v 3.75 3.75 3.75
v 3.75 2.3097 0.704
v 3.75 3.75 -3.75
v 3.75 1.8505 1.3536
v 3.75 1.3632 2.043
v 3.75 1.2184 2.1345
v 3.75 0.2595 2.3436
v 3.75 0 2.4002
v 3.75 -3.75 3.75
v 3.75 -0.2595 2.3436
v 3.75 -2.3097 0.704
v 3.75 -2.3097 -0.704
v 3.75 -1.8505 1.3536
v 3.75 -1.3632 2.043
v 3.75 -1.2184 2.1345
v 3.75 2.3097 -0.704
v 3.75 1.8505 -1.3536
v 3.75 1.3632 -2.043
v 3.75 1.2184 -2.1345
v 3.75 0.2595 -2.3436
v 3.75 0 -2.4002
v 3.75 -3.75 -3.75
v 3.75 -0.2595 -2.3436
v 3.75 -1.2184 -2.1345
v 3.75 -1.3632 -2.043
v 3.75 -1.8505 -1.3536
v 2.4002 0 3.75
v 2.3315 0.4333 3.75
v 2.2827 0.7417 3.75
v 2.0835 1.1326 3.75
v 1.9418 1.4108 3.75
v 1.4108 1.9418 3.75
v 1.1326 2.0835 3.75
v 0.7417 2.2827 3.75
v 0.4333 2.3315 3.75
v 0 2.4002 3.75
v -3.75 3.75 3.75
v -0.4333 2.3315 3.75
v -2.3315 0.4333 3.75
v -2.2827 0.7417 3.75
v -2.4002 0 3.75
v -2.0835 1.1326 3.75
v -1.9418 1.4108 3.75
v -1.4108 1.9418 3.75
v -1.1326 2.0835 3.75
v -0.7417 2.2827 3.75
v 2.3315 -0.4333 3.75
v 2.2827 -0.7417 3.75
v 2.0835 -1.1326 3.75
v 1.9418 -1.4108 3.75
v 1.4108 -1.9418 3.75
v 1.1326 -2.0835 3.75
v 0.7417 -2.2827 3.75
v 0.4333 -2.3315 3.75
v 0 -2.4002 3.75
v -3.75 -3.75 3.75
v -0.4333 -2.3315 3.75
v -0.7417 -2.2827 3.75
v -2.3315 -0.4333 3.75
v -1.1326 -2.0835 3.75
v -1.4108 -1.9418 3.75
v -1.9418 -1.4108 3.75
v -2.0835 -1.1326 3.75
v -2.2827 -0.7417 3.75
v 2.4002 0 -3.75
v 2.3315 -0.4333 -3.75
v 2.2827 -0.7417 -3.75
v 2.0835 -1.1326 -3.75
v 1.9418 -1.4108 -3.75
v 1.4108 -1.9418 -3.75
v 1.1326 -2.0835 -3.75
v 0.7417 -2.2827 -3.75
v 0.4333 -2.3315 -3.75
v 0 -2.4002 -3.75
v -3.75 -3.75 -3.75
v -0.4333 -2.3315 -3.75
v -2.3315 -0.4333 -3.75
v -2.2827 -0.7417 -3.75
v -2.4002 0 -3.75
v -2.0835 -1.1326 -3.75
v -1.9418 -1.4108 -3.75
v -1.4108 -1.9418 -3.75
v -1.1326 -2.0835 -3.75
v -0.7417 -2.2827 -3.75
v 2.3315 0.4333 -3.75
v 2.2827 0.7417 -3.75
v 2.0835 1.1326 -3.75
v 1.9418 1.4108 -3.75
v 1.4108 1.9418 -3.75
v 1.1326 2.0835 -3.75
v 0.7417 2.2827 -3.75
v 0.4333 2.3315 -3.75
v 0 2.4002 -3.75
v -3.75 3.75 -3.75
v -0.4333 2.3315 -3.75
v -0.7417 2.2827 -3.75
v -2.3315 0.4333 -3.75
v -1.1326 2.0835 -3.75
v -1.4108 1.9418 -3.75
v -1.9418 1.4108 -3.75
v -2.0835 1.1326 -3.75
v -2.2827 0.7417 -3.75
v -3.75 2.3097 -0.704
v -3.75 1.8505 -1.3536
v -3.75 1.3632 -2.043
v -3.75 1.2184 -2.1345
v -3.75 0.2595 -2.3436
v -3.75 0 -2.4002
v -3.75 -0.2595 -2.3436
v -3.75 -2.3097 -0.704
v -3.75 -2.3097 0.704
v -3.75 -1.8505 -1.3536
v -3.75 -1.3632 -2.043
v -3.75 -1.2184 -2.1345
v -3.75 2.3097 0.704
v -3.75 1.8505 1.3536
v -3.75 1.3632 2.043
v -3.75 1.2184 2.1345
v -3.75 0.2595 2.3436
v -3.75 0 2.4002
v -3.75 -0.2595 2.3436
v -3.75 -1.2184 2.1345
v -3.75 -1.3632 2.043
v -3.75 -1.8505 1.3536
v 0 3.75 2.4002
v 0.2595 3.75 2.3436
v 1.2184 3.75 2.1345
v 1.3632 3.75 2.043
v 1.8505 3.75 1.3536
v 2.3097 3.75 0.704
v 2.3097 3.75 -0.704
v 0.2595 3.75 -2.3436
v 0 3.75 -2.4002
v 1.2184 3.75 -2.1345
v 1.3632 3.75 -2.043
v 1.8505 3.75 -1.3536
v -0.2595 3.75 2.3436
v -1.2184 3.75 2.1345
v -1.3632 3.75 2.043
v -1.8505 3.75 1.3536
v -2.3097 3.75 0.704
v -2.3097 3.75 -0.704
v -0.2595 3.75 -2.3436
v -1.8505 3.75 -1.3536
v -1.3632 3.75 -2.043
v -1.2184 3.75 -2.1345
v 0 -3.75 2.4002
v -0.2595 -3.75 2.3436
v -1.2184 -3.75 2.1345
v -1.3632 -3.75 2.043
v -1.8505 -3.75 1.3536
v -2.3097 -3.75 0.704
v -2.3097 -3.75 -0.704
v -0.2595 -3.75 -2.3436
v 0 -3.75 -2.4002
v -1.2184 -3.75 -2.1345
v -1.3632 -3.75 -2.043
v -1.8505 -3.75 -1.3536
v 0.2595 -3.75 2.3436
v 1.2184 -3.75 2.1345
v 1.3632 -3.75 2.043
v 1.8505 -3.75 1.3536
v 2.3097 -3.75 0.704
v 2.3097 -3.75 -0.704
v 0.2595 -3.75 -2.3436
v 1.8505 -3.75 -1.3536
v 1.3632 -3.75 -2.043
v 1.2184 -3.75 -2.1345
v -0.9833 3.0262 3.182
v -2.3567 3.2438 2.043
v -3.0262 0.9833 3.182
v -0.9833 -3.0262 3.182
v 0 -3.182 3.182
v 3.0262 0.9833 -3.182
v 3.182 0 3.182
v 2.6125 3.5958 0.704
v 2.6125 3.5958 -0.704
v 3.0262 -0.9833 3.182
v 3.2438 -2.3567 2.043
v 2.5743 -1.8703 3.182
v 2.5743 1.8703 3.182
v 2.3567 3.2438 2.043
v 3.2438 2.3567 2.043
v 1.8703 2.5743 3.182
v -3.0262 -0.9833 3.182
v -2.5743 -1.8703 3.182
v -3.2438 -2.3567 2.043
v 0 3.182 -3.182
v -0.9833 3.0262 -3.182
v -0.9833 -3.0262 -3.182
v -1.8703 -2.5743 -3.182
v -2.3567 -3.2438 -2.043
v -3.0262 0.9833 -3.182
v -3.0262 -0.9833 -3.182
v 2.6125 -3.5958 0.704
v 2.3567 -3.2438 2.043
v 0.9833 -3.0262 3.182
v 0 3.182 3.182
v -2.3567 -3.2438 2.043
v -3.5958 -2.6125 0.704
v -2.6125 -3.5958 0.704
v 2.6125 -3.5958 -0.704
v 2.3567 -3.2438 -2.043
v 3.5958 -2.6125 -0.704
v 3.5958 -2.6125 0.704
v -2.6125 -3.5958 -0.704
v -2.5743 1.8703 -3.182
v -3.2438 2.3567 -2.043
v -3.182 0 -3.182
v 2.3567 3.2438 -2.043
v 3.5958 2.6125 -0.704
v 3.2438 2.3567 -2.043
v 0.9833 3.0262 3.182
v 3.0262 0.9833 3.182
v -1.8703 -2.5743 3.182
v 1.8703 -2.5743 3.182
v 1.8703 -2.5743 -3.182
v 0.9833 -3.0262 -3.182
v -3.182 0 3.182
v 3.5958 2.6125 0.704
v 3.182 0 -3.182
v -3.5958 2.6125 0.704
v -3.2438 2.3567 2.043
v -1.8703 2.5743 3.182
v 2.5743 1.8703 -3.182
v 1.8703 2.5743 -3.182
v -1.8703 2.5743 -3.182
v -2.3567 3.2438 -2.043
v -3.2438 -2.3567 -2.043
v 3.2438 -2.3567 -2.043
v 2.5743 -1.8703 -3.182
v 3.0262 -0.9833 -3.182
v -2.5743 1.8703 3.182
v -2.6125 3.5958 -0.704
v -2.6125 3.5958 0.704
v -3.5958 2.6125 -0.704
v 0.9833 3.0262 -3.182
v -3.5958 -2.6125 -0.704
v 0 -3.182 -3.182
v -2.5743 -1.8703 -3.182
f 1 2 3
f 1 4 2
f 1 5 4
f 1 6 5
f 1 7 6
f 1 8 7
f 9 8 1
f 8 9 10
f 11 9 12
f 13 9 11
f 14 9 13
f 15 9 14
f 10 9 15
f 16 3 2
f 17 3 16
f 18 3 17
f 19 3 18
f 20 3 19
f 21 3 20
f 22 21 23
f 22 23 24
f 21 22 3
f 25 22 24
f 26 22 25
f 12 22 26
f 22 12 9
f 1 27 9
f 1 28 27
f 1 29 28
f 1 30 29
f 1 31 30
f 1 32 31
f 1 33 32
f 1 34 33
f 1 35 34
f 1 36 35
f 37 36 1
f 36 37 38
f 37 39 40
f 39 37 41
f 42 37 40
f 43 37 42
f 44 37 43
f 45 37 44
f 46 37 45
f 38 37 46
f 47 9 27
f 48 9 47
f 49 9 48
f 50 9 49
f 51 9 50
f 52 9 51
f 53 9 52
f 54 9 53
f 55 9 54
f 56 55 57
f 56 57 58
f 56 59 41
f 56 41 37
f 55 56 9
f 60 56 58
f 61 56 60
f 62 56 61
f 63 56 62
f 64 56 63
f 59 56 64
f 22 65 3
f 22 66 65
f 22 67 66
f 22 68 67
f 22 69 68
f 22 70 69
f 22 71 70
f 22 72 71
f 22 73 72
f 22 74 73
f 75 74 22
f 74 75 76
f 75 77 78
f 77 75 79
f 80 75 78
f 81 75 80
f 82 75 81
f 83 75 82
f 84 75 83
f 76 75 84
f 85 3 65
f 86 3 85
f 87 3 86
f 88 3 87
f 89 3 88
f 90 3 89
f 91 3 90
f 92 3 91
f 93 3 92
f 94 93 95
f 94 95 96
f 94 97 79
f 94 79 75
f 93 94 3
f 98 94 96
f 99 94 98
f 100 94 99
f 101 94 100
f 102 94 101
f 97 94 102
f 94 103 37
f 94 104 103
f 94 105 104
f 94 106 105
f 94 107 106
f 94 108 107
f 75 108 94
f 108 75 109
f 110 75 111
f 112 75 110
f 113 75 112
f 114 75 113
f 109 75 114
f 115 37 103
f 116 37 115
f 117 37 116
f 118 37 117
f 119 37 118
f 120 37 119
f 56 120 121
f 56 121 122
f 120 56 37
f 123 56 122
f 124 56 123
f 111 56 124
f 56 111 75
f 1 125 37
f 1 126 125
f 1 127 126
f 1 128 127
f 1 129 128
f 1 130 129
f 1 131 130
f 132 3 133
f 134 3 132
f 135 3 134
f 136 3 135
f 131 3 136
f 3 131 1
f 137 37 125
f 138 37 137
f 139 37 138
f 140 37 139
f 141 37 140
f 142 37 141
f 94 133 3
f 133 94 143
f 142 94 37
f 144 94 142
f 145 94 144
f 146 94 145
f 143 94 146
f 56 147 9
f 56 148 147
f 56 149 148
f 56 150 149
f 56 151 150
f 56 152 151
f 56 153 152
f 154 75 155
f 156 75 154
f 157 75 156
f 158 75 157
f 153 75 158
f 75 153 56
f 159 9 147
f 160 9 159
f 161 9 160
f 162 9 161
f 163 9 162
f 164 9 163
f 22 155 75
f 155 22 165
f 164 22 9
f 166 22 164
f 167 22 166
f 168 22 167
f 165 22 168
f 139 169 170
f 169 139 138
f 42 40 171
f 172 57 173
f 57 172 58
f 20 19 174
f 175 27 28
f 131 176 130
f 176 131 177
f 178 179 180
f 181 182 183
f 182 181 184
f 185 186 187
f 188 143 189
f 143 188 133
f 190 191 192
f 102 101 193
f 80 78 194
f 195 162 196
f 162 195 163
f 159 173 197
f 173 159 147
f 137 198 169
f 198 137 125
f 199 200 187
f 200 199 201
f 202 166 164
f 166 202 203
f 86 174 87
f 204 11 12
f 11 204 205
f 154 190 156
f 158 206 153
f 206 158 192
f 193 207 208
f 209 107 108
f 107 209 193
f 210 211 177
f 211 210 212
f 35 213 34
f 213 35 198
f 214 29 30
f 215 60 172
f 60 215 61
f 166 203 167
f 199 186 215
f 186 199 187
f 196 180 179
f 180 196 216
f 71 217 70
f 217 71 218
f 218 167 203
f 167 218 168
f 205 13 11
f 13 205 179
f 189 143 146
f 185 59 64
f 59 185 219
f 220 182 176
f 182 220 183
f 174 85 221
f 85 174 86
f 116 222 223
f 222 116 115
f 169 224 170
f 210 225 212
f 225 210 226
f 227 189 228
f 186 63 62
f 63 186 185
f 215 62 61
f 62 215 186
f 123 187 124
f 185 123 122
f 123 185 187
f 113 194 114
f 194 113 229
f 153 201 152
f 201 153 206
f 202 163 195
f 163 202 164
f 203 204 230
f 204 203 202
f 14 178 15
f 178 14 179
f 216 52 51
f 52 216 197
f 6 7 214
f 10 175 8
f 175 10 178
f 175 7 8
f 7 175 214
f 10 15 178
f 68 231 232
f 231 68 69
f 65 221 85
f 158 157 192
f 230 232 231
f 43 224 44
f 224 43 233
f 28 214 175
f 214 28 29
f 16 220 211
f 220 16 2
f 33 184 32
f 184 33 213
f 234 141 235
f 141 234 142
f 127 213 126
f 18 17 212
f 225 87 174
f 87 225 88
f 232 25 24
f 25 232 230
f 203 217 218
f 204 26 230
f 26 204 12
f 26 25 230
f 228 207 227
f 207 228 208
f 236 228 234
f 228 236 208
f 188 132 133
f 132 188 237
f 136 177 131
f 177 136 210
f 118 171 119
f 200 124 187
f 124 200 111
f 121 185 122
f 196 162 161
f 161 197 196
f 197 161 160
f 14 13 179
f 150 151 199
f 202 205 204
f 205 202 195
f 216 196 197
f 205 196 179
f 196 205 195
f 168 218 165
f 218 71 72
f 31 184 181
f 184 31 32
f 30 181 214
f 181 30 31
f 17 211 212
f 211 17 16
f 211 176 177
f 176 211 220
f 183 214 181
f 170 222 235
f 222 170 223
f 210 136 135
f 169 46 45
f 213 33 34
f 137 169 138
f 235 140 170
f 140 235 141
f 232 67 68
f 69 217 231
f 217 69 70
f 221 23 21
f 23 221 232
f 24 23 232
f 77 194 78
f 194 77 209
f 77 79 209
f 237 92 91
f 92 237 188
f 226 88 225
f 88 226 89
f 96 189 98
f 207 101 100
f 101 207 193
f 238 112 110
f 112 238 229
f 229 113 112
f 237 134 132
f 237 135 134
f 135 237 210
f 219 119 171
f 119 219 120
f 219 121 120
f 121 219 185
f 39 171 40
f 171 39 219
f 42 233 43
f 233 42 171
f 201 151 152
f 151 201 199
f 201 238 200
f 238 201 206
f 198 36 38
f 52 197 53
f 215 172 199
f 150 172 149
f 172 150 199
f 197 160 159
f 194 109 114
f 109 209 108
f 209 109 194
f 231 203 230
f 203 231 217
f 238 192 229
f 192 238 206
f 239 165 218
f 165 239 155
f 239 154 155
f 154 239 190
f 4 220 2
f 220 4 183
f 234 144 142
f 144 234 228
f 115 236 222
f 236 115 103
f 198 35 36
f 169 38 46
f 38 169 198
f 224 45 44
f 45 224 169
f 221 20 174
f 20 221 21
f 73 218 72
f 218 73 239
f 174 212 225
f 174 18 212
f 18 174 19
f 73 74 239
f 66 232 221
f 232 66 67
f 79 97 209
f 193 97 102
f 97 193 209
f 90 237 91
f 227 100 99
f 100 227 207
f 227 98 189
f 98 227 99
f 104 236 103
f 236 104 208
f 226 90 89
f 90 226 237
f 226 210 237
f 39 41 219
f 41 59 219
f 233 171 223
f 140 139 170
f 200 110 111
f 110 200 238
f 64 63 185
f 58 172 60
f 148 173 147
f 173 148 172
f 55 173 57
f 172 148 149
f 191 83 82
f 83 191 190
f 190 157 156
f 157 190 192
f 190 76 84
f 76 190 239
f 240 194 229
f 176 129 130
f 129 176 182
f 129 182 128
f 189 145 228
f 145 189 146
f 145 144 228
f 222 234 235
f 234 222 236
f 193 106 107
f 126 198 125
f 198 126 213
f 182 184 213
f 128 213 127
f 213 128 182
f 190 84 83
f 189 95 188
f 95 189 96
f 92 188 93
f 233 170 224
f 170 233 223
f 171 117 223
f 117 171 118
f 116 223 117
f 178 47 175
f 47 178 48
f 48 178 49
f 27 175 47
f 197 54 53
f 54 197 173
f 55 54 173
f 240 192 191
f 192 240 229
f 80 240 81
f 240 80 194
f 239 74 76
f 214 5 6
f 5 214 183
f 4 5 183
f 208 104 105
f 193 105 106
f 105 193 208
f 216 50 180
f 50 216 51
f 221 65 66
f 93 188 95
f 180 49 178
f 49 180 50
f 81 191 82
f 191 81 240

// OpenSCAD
$fn = 20;
scale = 0.5;

 /*
// translate([-24,0,0]) 
    union() {
        cube(15 * scale, center=true);
        sphere(9 * scale);
    }
// */

/*
intersection() {
    cube(15* scale, center=true);
    sphere(9* scale);
}
// */

// /*
//translate([24,0,0]) 
  difference() {
    cube(15* scale, center=true);
    sphere(9* scale);
  }
// */
